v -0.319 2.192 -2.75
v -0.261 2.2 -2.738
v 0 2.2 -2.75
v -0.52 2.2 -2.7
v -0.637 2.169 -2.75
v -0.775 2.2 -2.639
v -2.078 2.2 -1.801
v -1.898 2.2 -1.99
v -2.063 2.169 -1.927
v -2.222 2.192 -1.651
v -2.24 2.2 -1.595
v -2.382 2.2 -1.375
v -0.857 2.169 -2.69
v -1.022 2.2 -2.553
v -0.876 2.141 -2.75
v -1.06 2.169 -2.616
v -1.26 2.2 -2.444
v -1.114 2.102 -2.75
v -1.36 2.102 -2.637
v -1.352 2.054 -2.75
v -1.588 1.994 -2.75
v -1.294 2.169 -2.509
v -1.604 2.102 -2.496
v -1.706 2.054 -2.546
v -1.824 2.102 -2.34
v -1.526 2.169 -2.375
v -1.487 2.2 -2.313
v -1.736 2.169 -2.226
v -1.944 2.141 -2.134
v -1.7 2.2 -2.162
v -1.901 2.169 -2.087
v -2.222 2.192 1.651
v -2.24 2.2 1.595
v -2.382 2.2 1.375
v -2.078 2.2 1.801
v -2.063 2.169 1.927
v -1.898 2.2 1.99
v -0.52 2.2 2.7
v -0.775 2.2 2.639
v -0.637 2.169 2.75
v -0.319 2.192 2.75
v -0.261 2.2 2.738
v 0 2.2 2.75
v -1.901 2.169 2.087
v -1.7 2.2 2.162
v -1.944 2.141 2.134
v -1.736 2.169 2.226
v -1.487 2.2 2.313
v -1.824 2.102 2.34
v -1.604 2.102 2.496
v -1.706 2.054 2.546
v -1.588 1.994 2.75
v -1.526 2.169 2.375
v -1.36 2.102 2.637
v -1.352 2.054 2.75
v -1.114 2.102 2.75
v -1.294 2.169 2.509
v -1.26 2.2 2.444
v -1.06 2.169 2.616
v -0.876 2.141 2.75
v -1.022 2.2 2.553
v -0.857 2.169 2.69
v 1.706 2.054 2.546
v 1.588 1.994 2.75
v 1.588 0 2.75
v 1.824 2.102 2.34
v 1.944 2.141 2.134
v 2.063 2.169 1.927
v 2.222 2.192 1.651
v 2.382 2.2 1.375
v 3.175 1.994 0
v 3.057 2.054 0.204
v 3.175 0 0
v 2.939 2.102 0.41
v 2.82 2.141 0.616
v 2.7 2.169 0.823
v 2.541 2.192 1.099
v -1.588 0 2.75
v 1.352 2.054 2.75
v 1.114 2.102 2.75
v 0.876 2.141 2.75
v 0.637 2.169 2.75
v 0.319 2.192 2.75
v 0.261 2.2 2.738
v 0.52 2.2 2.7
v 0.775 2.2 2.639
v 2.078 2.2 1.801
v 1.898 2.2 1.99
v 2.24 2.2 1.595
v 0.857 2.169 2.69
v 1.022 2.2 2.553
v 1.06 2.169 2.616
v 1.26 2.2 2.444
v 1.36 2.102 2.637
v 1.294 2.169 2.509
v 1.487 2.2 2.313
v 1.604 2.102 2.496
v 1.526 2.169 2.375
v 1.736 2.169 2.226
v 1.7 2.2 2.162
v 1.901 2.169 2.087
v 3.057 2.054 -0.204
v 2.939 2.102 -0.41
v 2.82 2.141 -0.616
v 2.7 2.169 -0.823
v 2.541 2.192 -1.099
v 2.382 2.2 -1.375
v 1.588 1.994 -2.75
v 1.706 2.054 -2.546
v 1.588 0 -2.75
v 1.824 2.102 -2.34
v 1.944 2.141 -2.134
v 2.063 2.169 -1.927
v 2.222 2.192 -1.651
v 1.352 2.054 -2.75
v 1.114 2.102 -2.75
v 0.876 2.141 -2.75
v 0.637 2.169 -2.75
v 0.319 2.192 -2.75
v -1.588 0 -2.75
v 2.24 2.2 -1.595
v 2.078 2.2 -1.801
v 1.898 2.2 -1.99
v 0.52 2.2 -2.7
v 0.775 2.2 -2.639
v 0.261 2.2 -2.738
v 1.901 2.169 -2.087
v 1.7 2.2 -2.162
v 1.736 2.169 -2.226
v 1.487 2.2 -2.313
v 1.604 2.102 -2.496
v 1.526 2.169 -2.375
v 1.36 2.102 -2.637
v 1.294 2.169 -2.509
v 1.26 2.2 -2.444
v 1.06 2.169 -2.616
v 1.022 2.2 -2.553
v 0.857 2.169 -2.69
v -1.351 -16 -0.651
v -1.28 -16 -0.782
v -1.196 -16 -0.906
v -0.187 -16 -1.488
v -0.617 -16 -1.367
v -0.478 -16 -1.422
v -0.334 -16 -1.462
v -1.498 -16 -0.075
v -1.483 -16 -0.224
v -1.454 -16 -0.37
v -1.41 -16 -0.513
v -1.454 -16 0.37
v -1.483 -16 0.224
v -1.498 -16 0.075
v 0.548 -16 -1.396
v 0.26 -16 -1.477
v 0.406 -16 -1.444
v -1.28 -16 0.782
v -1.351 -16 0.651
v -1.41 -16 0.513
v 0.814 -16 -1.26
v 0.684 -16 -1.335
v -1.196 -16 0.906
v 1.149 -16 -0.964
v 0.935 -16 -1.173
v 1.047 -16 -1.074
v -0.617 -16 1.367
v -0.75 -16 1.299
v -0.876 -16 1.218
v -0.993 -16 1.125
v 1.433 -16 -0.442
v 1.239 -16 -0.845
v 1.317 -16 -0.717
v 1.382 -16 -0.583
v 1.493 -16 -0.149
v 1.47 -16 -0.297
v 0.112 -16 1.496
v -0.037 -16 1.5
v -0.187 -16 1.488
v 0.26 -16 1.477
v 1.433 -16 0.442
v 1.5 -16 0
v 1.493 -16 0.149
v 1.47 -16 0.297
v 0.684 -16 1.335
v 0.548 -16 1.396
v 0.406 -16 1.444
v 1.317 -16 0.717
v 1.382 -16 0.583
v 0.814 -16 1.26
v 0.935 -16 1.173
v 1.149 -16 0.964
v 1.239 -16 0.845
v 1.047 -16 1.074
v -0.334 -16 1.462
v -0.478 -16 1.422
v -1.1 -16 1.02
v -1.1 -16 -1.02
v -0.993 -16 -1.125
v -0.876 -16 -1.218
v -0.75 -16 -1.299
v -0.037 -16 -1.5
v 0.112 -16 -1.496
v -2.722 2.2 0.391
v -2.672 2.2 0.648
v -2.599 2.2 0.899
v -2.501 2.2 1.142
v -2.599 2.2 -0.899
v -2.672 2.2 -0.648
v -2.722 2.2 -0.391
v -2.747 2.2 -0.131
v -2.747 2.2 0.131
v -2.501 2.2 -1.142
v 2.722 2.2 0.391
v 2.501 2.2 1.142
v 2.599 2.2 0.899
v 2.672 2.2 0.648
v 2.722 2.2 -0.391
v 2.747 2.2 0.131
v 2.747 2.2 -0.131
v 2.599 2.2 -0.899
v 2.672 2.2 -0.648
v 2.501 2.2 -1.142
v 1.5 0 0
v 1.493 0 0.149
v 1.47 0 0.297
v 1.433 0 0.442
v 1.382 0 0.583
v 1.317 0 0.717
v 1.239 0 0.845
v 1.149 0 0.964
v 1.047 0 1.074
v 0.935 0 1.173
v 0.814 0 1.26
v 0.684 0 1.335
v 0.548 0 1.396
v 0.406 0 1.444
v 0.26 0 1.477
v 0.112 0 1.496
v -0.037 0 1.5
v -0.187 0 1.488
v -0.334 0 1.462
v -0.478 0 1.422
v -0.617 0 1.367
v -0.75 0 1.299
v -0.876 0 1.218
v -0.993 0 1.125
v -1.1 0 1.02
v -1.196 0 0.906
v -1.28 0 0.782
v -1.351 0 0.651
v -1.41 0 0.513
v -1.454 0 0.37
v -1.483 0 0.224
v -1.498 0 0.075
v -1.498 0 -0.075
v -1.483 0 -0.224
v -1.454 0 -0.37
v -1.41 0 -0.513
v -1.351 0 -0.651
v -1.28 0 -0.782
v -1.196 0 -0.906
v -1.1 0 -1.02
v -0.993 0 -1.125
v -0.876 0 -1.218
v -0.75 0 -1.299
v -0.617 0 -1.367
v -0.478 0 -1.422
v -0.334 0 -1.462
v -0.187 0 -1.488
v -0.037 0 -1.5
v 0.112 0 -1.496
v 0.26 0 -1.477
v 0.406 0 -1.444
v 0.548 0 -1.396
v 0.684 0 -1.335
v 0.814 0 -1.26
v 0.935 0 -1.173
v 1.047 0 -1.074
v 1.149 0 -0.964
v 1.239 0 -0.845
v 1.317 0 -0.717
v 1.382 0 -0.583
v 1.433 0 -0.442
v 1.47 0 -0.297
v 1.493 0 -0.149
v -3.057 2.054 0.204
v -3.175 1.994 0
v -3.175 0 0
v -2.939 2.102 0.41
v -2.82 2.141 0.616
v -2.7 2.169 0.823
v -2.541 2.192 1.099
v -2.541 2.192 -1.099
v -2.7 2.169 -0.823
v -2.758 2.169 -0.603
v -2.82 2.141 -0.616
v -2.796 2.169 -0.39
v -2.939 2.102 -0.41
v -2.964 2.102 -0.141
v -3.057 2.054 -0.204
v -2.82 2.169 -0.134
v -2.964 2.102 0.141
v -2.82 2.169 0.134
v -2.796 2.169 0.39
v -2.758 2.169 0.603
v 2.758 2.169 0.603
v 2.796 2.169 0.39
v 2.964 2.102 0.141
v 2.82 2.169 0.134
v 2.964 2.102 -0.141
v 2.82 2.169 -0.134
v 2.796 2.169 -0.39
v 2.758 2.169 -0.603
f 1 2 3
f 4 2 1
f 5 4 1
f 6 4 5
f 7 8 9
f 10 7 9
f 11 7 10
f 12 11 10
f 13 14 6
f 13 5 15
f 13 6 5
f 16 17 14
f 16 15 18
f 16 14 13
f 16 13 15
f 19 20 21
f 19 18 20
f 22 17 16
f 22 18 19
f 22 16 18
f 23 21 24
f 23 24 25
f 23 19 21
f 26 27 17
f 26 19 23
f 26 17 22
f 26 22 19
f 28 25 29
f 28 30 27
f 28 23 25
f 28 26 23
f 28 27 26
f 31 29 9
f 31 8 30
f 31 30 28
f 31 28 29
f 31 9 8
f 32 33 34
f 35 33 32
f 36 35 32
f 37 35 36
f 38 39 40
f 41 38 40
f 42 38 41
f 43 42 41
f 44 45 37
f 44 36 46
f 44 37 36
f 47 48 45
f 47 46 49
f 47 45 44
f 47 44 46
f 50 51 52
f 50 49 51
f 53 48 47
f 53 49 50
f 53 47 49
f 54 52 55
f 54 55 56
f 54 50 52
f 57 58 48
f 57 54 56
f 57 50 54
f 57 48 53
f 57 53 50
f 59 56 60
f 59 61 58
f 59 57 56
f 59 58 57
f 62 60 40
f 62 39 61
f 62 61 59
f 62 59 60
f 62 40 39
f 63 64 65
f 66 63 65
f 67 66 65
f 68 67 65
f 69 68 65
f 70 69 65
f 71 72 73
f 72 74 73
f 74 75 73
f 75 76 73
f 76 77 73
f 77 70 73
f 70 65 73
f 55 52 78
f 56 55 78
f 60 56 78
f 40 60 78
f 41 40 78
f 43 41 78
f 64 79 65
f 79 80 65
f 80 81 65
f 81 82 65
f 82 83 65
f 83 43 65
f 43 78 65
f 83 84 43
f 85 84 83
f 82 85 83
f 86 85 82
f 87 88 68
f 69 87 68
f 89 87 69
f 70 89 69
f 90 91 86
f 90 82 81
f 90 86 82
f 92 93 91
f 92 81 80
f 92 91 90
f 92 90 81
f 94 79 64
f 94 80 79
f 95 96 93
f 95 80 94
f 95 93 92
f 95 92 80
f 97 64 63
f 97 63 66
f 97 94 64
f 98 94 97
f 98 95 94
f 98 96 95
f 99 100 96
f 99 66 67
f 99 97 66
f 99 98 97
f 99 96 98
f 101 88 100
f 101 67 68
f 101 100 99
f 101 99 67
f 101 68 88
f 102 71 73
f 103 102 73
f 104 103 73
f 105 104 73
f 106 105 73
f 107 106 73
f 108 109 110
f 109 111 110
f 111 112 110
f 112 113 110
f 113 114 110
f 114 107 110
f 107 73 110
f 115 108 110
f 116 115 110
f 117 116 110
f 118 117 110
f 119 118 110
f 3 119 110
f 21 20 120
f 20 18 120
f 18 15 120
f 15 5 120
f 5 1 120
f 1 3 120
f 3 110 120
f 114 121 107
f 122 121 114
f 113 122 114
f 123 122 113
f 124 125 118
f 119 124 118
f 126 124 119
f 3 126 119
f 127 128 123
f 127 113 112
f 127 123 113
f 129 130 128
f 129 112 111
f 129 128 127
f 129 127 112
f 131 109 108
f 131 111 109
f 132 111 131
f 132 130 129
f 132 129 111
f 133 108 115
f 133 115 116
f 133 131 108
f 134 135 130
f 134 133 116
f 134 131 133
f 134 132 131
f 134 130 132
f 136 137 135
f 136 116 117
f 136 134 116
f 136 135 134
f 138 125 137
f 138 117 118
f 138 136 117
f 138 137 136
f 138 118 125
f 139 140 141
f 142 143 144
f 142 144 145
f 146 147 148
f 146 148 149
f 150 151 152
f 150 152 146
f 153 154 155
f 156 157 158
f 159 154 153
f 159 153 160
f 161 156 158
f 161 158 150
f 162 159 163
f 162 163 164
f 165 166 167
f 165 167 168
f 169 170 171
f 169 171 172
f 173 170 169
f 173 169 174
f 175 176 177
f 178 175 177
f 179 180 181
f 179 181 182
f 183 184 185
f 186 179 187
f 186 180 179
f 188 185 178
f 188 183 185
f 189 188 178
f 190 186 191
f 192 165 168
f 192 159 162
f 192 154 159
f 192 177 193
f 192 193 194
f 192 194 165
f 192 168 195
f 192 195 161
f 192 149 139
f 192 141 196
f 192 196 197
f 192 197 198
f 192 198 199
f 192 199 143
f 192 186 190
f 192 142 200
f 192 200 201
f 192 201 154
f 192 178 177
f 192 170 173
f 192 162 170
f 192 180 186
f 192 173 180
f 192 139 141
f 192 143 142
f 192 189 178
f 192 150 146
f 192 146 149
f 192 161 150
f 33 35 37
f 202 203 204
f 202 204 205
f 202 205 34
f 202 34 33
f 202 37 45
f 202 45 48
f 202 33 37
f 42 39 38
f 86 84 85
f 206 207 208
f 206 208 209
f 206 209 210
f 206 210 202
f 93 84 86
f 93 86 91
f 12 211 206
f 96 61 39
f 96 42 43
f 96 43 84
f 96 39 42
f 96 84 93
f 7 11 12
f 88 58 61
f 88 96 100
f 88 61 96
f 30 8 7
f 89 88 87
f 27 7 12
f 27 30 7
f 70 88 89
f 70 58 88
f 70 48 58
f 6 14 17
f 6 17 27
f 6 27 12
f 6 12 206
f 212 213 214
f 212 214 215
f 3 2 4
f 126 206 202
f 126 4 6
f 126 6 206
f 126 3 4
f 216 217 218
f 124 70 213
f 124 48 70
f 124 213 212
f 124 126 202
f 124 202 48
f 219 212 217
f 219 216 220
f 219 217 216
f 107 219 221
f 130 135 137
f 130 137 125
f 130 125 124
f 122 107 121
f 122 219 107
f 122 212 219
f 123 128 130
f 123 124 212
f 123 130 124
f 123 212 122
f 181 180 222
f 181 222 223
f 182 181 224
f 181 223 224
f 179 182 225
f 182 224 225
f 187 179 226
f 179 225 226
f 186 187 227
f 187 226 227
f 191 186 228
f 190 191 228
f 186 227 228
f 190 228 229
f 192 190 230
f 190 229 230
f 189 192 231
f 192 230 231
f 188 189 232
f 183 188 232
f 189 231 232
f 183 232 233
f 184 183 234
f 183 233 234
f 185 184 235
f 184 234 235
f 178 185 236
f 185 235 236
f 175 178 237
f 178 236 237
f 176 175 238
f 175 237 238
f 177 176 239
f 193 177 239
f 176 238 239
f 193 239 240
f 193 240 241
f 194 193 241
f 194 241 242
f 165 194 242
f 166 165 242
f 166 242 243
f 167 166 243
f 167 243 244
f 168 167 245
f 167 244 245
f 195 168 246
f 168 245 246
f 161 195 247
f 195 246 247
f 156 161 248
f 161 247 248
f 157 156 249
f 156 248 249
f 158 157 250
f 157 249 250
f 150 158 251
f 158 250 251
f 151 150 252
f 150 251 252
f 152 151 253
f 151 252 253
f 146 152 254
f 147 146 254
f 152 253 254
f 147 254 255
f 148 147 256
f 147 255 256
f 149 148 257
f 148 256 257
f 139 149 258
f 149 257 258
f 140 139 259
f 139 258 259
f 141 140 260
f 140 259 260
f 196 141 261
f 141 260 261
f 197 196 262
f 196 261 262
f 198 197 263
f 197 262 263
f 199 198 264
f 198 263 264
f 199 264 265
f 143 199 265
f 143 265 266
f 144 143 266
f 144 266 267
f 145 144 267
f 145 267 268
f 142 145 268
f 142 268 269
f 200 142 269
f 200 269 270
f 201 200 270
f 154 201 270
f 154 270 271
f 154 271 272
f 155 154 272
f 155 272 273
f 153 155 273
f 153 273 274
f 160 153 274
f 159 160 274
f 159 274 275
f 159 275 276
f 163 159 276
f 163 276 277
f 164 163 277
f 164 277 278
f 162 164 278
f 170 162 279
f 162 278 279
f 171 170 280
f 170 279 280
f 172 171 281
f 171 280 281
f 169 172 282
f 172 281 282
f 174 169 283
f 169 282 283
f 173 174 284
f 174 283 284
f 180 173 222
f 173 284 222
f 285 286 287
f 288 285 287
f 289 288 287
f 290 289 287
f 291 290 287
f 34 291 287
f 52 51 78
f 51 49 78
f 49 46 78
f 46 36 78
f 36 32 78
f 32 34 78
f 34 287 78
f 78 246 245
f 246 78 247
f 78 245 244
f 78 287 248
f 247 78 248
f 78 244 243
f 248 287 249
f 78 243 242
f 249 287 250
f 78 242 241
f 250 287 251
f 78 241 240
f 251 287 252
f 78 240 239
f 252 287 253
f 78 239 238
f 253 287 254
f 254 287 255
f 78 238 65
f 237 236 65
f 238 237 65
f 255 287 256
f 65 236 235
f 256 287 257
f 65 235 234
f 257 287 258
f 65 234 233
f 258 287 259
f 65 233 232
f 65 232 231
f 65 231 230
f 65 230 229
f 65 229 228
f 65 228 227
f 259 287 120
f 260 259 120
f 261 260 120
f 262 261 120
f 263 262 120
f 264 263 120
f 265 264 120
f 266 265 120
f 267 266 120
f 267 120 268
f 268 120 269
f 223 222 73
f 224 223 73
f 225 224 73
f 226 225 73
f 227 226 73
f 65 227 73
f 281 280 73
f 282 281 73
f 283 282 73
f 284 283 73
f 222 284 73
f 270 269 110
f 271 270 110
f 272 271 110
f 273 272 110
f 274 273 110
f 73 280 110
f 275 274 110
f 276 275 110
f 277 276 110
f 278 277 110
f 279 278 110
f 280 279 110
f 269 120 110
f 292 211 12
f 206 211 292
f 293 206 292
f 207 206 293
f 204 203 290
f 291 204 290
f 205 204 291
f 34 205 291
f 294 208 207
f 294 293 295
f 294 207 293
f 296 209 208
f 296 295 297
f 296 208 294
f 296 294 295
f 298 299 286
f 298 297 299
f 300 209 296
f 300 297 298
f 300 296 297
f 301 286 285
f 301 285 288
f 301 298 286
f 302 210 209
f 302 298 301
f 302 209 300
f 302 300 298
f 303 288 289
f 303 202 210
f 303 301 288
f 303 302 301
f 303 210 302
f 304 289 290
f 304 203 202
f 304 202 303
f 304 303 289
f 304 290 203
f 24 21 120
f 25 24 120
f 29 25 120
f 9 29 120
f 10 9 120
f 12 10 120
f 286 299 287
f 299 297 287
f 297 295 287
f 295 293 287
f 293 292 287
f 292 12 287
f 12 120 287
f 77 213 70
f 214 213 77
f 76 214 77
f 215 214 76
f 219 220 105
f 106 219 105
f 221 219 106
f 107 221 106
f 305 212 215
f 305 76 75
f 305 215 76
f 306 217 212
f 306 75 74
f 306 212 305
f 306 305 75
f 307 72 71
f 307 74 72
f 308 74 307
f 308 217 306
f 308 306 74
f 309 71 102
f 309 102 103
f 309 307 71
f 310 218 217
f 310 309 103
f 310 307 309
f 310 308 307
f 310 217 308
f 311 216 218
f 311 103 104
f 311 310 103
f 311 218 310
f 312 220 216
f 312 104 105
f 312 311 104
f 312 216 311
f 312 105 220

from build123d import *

# Parameters (mm, degrees)
EXTRUDE_1_DEPTH = 2.2
SKETCH_3_R      = 1.5
EXTRUDE_2_DEPTH = 16


with BuildPart() as part:
    # 草图1 → 凸台-拉伸1 (new body)
    with BuildSketch(Plane(origin=(0, 0, 0), x_dir=(1, 0, 0), z_dir=(0, 1, 0))):
        Polygon((3.175426481, 0), (1.58771324, 2.75), (-1.58771324, 2.75), (-3.175426481, 0), (-1.58771324, -2.75), (1.58771324, -2.75), align=None)
    extrude(amount=EXTRUDE_1_DEPTH)

    # 草图2 → 切除-旋转1 (revolve, cut)
    with BuildSketch(Plane(origin=(0, 0, 0), x_dir=(0, 0, -1), z_dir=(1, 0, 0))):
        with BuildLine():
            Line((-2.75, 2.2), (-4.95, 2.2))
            Line((-4.95, 2.2), (-4.95, 0))
            ThreePointArc((-4.95, 0), (-4.068803604, 1.318803604), (-2.75, 2.2))
        make_face()
    revolve(axis=Axis((0, 0, 0), (0, 1, 0)), mode=Mode.SUBTRACT)

    # 草图3 → 凸台-拉伸2 (add)
    with BuildSketch(Plane.XZ):
        Circle(SKETCH_3_R)
    extrude(amount=EXTRUDE_2_DEPTH)


solid = part.part
